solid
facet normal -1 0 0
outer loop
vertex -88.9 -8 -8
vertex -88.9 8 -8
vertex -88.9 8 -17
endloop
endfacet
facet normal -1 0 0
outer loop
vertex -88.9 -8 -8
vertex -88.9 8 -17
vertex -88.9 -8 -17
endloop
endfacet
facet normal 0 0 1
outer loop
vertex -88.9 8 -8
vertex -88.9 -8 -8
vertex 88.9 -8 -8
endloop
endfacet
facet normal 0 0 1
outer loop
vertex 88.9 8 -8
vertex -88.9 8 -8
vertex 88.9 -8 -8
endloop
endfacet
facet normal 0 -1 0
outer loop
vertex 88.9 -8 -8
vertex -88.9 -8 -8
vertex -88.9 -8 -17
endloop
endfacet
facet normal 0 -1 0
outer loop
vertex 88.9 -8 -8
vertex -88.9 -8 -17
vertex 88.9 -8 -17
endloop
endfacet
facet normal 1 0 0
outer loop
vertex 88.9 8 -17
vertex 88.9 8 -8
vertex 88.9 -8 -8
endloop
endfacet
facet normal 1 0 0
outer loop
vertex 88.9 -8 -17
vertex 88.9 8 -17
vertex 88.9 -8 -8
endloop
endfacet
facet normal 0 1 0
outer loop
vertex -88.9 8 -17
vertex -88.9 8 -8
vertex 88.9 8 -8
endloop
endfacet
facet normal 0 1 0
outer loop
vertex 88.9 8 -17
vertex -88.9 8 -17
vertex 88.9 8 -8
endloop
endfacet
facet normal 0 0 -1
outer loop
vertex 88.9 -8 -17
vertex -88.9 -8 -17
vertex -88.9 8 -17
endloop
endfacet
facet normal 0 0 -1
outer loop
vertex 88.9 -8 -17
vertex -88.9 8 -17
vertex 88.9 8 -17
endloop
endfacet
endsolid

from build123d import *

# Parameters (mm, degrees)
SKETCH_W        = 177.8
SKETCH_H        = 16
PAD_DEPTH       = 9
BODY_ROLL_ANGLE = 90


with BuildPart() as part:
    # Sketch → Pad (new body)
    with BuildSketch(Plane.XZ):
        Rectangle(SKETCH_W, SKETCH_H)
    extrude(amount=PAD_DEPTH)


with BuildPart() as part_1:
    # Body roll: moved
    add(part.part.rotate(Axis((0, 0, 0), (1, 0, 0)), BODY_ROLL_ANGLE))


with BuildPart() as part_2:
    # Body placement: moved
    add(part_1.part.moved(Location((0, 0, -8))))


solid = part_2.part
